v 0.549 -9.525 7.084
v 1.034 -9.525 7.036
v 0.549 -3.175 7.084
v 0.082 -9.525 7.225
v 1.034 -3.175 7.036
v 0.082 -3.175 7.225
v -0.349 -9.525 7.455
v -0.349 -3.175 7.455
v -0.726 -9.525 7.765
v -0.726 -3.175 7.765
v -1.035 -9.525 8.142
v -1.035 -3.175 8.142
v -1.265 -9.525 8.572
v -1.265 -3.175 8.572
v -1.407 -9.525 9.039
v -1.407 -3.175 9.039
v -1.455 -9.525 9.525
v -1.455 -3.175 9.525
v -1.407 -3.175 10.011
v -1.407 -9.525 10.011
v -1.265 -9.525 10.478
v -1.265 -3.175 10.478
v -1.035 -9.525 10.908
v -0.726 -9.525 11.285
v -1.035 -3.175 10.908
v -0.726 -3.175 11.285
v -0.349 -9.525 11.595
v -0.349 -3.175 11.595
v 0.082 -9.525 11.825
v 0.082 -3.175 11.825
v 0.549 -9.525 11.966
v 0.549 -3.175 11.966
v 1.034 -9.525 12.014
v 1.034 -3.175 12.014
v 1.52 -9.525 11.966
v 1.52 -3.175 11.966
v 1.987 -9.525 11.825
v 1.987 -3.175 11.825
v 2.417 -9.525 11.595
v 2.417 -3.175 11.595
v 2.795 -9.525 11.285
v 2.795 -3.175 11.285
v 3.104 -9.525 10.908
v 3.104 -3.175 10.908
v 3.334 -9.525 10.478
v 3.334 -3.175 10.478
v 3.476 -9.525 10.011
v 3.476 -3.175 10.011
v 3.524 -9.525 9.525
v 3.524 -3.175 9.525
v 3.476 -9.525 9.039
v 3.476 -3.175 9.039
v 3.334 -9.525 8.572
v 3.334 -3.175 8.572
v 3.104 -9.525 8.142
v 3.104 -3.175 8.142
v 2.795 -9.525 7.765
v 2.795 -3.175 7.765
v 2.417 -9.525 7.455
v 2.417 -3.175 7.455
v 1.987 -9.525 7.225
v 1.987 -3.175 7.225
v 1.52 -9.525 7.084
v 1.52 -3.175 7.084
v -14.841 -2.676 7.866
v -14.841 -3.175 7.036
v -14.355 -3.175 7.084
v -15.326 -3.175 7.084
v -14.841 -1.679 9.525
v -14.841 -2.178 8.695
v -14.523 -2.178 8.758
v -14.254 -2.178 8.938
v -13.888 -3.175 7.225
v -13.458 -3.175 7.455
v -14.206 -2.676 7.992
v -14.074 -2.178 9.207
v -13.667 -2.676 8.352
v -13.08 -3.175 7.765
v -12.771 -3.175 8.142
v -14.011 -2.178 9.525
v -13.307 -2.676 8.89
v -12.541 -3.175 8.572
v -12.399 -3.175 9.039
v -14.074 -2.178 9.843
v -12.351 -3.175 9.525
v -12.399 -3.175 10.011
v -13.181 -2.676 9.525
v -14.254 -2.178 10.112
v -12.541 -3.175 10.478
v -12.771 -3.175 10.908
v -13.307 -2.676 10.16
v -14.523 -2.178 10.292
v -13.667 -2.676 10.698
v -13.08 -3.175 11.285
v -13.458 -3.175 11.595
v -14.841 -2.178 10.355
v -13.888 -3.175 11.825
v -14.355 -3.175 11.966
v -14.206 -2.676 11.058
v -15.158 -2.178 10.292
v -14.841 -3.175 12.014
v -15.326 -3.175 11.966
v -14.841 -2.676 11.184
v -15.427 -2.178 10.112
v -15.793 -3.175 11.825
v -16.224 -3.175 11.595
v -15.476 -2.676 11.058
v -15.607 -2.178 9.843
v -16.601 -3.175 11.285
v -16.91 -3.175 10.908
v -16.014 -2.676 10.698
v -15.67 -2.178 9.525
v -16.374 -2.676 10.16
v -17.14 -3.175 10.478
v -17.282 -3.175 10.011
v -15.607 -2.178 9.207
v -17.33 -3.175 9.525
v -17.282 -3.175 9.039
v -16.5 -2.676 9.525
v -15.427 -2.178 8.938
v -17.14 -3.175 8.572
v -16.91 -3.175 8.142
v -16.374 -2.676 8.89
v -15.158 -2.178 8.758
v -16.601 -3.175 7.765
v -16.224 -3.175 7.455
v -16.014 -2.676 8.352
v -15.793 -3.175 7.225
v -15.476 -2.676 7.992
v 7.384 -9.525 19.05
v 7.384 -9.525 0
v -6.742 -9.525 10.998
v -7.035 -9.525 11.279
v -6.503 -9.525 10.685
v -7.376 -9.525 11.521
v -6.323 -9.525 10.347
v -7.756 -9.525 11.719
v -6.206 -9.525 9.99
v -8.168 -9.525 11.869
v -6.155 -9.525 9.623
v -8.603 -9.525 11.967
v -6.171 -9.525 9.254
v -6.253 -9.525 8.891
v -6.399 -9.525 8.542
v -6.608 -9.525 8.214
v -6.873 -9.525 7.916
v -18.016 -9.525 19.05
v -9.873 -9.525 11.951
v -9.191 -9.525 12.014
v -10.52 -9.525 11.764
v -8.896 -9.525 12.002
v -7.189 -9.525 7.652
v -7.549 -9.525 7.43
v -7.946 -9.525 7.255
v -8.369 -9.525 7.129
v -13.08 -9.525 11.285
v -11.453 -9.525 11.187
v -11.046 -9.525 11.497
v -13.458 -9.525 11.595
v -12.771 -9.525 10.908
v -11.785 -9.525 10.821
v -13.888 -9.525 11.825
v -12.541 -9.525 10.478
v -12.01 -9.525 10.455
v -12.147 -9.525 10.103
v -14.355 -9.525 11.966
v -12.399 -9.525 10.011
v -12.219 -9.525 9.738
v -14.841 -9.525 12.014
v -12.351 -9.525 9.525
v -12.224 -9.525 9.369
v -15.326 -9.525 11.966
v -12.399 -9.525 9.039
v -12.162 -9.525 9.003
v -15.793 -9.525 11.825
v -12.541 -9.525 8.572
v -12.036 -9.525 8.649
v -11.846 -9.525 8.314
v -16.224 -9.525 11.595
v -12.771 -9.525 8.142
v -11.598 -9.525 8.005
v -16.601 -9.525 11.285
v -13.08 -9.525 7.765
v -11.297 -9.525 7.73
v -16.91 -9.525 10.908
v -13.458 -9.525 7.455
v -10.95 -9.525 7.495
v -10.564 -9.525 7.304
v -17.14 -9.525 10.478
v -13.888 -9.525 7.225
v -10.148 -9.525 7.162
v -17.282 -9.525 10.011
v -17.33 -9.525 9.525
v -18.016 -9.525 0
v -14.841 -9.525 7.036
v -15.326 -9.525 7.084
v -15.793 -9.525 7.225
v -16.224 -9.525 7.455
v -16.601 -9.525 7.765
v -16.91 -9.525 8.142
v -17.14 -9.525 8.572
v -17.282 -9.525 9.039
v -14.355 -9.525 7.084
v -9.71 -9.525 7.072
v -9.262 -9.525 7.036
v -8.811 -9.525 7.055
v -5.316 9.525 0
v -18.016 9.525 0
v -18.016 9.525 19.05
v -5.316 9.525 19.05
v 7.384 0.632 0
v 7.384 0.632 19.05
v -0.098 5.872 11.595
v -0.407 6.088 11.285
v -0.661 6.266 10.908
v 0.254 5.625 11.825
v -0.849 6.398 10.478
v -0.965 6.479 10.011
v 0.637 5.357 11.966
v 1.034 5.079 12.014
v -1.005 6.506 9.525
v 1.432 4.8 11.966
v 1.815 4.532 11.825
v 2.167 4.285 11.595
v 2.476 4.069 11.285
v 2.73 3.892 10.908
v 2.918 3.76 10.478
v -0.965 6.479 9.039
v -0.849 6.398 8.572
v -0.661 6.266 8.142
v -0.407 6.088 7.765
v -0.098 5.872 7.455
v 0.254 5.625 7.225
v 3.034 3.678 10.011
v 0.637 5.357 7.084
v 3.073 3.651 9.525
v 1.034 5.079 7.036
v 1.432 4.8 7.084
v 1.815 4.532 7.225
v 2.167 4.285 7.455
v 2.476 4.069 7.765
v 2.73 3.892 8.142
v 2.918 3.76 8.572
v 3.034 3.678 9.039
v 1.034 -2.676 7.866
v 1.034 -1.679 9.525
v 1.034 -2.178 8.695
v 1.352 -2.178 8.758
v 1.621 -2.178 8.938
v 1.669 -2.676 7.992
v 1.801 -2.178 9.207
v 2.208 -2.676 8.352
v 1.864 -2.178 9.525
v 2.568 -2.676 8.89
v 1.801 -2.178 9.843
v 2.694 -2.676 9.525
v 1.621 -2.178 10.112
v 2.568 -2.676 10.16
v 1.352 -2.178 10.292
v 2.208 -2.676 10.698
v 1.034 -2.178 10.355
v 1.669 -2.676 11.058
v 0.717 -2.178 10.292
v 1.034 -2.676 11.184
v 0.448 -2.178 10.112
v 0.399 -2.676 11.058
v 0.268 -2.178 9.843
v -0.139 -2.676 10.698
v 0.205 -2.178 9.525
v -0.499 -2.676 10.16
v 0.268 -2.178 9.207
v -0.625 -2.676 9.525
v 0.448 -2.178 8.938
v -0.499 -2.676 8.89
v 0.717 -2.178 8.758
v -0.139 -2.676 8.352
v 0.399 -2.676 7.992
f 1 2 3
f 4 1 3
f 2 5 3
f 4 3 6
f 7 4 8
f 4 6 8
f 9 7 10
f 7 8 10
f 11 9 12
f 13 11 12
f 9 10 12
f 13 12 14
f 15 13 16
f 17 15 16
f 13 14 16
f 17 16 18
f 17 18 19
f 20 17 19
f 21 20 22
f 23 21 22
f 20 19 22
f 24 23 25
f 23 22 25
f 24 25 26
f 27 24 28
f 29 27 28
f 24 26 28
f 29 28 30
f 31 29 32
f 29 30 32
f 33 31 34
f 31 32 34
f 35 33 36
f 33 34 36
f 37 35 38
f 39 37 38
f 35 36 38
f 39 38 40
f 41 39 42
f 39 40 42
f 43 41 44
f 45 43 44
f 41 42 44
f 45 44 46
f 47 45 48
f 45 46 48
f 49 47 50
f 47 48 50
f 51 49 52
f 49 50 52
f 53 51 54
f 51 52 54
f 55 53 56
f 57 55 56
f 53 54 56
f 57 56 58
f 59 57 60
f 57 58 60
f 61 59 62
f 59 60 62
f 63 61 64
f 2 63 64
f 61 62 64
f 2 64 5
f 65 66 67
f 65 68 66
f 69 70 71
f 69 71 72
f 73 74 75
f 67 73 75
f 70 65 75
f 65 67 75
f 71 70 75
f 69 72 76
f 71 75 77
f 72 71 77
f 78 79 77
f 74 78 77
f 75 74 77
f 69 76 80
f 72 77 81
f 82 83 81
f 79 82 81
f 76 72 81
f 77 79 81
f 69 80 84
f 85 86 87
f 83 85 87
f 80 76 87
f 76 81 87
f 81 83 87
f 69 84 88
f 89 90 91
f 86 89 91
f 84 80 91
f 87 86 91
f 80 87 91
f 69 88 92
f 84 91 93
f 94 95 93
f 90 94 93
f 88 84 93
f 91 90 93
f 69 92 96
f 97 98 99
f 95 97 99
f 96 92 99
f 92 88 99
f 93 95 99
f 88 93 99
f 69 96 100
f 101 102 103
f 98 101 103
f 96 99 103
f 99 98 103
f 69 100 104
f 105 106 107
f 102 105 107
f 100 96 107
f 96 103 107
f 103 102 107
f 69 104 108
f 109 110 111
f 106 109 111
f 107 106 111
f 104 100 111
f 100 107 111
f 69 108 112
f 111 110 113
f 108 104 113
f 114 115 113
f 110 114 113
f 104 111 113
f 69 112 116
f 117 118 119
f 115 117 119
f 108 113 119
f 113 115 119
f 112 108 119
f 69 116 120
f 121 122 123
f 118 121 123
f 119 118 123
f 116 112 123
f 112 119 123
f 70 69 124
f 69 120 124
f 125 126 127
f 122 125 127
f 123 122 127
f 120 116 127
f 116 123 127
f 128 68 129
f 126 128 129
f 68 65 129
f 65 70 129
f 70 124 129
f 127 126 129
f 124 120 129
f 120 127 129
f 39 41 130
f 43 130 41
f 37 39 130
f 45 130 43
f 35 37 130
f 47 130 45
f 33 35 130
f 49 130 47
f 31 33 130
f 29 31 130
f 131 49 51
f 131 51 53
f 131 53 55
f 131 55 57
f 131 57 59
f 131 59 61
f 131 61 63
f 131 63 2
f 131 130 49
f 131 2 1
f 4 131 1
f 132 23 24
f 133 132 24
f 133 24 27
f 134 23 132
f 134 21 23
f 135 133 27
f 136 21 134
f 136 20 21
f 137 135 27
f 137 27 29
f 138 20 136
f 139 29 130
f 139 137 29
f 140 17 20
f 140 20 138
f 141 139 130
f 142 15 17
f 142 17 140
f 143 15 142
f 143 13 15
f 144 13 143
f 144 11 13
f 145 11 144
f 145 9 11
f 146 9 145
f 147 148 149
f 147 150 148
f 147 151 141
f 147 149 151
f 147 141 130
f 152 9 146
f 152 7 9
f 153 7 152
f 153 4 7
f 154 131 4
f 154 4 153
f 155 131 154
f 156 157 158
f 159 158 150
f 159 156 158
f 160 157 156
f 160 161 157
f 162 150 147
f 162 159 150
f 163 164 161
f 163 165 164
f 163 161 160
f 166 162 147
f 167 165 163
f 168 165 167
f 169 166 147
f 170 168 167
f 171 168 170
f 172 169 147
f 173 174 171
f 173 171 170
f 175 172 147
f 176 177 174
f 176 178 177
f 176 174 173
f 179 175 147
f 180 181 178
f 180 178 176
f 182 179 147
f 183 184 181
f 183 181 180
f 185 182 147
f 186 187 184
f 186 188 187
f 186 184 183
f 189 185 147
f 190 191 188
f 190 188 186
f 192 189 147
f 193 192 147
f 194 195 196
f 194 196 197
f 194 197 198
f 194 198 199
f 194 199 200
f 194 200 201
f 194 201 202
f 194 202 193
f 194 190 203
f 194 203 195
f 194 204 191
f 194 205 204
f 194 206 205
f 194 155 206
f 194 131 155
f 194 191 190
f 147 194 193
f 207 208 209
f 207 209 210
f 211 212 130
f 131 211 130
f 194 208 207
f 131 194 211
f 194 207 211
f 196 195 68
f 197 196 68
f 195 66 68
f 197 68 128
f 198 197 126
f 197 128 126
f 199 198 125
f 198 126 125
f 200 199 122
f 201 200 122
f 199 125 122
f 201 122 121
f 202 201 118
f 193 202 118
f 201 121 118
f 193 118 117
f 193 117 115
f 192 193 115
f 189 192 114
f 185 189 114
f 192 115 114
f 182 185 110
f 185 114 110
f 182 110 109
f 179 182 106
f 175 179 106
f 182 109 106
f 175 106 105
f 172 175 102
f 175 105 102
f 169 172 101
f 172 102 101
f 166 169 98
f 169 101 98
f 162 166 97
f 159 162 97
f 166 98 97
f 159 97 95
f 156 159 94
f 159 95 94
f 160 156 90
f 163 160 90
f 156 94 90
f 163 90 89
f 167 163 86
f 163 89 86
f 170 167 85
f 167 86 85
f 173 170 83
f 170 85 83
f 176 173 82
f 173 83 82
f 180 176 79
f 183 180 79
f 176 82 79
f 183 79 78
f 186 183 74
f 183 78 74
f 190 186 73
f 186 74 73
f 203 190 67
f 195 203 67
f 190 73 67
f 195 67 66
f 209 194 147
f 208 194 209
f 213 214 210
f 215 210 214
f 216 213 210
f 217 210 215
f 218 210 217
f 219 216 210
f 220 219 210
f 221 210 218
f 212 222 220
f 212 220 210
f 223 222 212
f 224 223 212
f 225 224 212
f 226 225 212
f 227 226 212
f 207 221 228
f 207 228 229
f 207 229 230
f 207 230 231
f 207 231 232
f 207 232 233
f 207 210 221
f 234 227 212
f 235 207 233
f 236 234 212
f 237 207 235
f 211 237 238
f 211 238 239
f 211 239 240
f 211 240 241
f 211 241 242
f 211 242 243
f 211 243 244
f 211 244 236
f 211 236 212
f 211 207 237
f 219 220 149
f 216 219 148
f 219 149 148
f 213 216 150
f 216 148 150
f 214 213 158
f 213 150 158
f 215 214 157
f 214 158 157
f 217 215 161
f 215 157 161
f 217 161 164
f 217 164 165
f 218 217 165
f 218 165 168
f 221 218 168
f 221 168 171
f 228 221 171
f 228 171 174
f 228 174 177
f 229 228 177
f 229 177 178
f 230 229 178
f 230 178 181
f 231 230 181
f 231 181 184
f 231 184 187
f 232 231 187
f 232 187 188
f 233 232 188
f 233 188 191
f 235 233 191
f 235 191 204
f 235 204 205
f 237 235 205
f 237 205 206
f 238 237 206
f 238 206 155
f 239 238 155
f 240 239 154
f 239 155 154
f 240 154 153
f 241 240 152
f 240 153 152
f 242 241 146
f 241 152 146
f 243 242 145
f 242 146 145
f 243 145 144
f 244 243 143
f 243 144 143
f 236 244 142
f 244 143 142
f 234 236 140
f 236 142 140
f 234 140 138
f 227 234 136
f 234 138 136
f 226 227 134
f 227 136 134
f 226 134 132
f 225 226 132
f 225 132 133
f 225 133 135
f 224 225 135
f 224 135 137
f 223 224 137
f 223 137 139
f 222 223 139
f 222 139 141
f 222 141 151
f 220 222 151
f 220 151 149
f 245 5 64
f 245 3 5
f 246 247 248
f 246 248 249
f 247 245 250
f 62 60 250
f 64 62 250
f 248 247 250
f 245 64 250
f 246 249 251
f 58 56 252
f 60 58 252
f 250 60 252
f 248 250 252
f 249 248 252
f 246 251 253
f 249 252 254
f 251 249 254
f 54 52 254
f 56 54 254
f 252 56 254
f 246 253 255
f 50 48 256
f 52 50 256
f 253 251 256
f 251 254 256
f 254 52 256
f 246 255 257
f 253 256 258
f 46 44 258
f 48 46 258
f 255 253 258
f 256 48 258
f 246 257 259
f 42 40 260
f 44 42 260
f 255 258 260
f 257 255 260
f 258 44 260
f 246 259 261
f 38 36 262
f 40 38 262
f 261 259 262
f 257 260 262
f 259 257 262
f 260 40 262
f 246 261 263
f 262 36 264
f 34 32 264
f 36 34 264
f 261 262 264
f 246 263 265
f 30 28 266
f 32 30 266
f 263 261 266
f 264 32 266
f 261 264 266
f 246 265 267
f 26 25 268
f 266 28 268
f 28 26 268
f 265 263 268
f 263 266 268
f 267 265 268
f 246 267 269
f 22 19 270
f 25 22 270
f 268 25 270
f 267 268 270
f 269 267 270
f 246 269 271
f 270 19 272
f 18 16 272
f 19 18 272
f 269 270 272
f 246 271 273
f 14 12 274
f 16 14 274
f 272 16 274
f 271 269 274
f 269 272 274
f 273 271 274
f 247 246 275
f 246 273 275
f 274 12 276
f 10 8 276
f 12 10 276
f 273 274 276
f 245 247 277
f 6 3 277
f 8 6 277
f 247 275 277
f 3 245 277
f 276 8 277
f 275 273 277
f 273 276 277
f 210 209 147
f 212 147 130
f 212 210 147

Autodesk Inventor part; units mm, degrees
ref_plane "YZ Plane" through (0, 0, 0) normal (1, 0, 0) x (0, 1, 0)
ref_plane "XZ Plane" through (0, 0, 0) normal (0, 1, 0) x (-1, 0, 0)
ref_plane "XY Plane" through (0, 0, 0) normal (0, 0, 1) x (1, 0, 0)
sketch "Sketch1" plane through (0, 0, 0) normal (0, 0, 1) x (1, 0, 0)
  line L0 (-23.0956, 0) -> (12.4644, 0) projected
  line L1 (0, -13.335) -> (0, 13.335) projected
  line L2 (-18.0156, 9.525) -> (-5.3156, 9.525)
  line L3 (7.3844, 0.6324) -> (7.3844, -9.525)
  line L4 (7.3844, -9.525) -> (-18.0156, -9.525)
  line L5 (-18.0156, -9.525) -> (-18.0156, 9.525)
  line L6 (-5.3156, 9.525) -> (7.3844, 0.6324)
  point P0 (0, 0)
  point P1 (-18.0156, 0)
  point P2 (0, 9.525)
  dimension "d0" = 19.05
  dimension "d2" = 25.4
  dimension "d21" = 35
extrude "Extrusion1" add sketch "Sketch1" along normal blind 19.05
sketch "Sketch2" plane through (7.3844, 0.6324, 19.05) normal (0.5736, 0.8192, 0) x (0.8192, -0.5736, 0)
  line L0 (-15.5038, 19.05) -> (0, 19.05) projected
  line L1 (-15.5038, 19.05) -> (-15.5038, 0) projected
  point P0 (-5.6862, 19.05)
  point P1 (-7.7519, 9.525)
  point P2 (-15.5038, 9.525)
  point P3 (-7.7519, 19.05)
hole "Hole1" at (1.0344, 5.0787, 9.525) direction (-0.5736, -0.8192, 0) diameter 4.9784 end through all thread size "1/4-20 UNC" class "2B" standard "ANSI Unified Screw Threads"
sketch "Sketch3" plane through (-18.0156, -9.525, 0) normal (0, -1, 0) x (1, 0, 0)
  line L0 (25.4, 0) -> (25.4, 19.05) projected
  point P0 (18.0156, 0)
  point P1 (19.05, 9.525)
  point P2 (25.4, 9.525)
  point P3 (3.175, 9.525)
  dimension "d12" = 6.35
  dimension "d20" = 15.875
hole "Hole2" at (1.0344, -9.525, 9.525) at (-14.8406, -9.525, 9.525) direction (0, 1, 0) diameter 4.9784 depth 6.35 tip angle 118 thread size "1/4-20 UNC" class "2B" standard "ANSI Unified Screw Threads"
properties part number "transfer mount block"
